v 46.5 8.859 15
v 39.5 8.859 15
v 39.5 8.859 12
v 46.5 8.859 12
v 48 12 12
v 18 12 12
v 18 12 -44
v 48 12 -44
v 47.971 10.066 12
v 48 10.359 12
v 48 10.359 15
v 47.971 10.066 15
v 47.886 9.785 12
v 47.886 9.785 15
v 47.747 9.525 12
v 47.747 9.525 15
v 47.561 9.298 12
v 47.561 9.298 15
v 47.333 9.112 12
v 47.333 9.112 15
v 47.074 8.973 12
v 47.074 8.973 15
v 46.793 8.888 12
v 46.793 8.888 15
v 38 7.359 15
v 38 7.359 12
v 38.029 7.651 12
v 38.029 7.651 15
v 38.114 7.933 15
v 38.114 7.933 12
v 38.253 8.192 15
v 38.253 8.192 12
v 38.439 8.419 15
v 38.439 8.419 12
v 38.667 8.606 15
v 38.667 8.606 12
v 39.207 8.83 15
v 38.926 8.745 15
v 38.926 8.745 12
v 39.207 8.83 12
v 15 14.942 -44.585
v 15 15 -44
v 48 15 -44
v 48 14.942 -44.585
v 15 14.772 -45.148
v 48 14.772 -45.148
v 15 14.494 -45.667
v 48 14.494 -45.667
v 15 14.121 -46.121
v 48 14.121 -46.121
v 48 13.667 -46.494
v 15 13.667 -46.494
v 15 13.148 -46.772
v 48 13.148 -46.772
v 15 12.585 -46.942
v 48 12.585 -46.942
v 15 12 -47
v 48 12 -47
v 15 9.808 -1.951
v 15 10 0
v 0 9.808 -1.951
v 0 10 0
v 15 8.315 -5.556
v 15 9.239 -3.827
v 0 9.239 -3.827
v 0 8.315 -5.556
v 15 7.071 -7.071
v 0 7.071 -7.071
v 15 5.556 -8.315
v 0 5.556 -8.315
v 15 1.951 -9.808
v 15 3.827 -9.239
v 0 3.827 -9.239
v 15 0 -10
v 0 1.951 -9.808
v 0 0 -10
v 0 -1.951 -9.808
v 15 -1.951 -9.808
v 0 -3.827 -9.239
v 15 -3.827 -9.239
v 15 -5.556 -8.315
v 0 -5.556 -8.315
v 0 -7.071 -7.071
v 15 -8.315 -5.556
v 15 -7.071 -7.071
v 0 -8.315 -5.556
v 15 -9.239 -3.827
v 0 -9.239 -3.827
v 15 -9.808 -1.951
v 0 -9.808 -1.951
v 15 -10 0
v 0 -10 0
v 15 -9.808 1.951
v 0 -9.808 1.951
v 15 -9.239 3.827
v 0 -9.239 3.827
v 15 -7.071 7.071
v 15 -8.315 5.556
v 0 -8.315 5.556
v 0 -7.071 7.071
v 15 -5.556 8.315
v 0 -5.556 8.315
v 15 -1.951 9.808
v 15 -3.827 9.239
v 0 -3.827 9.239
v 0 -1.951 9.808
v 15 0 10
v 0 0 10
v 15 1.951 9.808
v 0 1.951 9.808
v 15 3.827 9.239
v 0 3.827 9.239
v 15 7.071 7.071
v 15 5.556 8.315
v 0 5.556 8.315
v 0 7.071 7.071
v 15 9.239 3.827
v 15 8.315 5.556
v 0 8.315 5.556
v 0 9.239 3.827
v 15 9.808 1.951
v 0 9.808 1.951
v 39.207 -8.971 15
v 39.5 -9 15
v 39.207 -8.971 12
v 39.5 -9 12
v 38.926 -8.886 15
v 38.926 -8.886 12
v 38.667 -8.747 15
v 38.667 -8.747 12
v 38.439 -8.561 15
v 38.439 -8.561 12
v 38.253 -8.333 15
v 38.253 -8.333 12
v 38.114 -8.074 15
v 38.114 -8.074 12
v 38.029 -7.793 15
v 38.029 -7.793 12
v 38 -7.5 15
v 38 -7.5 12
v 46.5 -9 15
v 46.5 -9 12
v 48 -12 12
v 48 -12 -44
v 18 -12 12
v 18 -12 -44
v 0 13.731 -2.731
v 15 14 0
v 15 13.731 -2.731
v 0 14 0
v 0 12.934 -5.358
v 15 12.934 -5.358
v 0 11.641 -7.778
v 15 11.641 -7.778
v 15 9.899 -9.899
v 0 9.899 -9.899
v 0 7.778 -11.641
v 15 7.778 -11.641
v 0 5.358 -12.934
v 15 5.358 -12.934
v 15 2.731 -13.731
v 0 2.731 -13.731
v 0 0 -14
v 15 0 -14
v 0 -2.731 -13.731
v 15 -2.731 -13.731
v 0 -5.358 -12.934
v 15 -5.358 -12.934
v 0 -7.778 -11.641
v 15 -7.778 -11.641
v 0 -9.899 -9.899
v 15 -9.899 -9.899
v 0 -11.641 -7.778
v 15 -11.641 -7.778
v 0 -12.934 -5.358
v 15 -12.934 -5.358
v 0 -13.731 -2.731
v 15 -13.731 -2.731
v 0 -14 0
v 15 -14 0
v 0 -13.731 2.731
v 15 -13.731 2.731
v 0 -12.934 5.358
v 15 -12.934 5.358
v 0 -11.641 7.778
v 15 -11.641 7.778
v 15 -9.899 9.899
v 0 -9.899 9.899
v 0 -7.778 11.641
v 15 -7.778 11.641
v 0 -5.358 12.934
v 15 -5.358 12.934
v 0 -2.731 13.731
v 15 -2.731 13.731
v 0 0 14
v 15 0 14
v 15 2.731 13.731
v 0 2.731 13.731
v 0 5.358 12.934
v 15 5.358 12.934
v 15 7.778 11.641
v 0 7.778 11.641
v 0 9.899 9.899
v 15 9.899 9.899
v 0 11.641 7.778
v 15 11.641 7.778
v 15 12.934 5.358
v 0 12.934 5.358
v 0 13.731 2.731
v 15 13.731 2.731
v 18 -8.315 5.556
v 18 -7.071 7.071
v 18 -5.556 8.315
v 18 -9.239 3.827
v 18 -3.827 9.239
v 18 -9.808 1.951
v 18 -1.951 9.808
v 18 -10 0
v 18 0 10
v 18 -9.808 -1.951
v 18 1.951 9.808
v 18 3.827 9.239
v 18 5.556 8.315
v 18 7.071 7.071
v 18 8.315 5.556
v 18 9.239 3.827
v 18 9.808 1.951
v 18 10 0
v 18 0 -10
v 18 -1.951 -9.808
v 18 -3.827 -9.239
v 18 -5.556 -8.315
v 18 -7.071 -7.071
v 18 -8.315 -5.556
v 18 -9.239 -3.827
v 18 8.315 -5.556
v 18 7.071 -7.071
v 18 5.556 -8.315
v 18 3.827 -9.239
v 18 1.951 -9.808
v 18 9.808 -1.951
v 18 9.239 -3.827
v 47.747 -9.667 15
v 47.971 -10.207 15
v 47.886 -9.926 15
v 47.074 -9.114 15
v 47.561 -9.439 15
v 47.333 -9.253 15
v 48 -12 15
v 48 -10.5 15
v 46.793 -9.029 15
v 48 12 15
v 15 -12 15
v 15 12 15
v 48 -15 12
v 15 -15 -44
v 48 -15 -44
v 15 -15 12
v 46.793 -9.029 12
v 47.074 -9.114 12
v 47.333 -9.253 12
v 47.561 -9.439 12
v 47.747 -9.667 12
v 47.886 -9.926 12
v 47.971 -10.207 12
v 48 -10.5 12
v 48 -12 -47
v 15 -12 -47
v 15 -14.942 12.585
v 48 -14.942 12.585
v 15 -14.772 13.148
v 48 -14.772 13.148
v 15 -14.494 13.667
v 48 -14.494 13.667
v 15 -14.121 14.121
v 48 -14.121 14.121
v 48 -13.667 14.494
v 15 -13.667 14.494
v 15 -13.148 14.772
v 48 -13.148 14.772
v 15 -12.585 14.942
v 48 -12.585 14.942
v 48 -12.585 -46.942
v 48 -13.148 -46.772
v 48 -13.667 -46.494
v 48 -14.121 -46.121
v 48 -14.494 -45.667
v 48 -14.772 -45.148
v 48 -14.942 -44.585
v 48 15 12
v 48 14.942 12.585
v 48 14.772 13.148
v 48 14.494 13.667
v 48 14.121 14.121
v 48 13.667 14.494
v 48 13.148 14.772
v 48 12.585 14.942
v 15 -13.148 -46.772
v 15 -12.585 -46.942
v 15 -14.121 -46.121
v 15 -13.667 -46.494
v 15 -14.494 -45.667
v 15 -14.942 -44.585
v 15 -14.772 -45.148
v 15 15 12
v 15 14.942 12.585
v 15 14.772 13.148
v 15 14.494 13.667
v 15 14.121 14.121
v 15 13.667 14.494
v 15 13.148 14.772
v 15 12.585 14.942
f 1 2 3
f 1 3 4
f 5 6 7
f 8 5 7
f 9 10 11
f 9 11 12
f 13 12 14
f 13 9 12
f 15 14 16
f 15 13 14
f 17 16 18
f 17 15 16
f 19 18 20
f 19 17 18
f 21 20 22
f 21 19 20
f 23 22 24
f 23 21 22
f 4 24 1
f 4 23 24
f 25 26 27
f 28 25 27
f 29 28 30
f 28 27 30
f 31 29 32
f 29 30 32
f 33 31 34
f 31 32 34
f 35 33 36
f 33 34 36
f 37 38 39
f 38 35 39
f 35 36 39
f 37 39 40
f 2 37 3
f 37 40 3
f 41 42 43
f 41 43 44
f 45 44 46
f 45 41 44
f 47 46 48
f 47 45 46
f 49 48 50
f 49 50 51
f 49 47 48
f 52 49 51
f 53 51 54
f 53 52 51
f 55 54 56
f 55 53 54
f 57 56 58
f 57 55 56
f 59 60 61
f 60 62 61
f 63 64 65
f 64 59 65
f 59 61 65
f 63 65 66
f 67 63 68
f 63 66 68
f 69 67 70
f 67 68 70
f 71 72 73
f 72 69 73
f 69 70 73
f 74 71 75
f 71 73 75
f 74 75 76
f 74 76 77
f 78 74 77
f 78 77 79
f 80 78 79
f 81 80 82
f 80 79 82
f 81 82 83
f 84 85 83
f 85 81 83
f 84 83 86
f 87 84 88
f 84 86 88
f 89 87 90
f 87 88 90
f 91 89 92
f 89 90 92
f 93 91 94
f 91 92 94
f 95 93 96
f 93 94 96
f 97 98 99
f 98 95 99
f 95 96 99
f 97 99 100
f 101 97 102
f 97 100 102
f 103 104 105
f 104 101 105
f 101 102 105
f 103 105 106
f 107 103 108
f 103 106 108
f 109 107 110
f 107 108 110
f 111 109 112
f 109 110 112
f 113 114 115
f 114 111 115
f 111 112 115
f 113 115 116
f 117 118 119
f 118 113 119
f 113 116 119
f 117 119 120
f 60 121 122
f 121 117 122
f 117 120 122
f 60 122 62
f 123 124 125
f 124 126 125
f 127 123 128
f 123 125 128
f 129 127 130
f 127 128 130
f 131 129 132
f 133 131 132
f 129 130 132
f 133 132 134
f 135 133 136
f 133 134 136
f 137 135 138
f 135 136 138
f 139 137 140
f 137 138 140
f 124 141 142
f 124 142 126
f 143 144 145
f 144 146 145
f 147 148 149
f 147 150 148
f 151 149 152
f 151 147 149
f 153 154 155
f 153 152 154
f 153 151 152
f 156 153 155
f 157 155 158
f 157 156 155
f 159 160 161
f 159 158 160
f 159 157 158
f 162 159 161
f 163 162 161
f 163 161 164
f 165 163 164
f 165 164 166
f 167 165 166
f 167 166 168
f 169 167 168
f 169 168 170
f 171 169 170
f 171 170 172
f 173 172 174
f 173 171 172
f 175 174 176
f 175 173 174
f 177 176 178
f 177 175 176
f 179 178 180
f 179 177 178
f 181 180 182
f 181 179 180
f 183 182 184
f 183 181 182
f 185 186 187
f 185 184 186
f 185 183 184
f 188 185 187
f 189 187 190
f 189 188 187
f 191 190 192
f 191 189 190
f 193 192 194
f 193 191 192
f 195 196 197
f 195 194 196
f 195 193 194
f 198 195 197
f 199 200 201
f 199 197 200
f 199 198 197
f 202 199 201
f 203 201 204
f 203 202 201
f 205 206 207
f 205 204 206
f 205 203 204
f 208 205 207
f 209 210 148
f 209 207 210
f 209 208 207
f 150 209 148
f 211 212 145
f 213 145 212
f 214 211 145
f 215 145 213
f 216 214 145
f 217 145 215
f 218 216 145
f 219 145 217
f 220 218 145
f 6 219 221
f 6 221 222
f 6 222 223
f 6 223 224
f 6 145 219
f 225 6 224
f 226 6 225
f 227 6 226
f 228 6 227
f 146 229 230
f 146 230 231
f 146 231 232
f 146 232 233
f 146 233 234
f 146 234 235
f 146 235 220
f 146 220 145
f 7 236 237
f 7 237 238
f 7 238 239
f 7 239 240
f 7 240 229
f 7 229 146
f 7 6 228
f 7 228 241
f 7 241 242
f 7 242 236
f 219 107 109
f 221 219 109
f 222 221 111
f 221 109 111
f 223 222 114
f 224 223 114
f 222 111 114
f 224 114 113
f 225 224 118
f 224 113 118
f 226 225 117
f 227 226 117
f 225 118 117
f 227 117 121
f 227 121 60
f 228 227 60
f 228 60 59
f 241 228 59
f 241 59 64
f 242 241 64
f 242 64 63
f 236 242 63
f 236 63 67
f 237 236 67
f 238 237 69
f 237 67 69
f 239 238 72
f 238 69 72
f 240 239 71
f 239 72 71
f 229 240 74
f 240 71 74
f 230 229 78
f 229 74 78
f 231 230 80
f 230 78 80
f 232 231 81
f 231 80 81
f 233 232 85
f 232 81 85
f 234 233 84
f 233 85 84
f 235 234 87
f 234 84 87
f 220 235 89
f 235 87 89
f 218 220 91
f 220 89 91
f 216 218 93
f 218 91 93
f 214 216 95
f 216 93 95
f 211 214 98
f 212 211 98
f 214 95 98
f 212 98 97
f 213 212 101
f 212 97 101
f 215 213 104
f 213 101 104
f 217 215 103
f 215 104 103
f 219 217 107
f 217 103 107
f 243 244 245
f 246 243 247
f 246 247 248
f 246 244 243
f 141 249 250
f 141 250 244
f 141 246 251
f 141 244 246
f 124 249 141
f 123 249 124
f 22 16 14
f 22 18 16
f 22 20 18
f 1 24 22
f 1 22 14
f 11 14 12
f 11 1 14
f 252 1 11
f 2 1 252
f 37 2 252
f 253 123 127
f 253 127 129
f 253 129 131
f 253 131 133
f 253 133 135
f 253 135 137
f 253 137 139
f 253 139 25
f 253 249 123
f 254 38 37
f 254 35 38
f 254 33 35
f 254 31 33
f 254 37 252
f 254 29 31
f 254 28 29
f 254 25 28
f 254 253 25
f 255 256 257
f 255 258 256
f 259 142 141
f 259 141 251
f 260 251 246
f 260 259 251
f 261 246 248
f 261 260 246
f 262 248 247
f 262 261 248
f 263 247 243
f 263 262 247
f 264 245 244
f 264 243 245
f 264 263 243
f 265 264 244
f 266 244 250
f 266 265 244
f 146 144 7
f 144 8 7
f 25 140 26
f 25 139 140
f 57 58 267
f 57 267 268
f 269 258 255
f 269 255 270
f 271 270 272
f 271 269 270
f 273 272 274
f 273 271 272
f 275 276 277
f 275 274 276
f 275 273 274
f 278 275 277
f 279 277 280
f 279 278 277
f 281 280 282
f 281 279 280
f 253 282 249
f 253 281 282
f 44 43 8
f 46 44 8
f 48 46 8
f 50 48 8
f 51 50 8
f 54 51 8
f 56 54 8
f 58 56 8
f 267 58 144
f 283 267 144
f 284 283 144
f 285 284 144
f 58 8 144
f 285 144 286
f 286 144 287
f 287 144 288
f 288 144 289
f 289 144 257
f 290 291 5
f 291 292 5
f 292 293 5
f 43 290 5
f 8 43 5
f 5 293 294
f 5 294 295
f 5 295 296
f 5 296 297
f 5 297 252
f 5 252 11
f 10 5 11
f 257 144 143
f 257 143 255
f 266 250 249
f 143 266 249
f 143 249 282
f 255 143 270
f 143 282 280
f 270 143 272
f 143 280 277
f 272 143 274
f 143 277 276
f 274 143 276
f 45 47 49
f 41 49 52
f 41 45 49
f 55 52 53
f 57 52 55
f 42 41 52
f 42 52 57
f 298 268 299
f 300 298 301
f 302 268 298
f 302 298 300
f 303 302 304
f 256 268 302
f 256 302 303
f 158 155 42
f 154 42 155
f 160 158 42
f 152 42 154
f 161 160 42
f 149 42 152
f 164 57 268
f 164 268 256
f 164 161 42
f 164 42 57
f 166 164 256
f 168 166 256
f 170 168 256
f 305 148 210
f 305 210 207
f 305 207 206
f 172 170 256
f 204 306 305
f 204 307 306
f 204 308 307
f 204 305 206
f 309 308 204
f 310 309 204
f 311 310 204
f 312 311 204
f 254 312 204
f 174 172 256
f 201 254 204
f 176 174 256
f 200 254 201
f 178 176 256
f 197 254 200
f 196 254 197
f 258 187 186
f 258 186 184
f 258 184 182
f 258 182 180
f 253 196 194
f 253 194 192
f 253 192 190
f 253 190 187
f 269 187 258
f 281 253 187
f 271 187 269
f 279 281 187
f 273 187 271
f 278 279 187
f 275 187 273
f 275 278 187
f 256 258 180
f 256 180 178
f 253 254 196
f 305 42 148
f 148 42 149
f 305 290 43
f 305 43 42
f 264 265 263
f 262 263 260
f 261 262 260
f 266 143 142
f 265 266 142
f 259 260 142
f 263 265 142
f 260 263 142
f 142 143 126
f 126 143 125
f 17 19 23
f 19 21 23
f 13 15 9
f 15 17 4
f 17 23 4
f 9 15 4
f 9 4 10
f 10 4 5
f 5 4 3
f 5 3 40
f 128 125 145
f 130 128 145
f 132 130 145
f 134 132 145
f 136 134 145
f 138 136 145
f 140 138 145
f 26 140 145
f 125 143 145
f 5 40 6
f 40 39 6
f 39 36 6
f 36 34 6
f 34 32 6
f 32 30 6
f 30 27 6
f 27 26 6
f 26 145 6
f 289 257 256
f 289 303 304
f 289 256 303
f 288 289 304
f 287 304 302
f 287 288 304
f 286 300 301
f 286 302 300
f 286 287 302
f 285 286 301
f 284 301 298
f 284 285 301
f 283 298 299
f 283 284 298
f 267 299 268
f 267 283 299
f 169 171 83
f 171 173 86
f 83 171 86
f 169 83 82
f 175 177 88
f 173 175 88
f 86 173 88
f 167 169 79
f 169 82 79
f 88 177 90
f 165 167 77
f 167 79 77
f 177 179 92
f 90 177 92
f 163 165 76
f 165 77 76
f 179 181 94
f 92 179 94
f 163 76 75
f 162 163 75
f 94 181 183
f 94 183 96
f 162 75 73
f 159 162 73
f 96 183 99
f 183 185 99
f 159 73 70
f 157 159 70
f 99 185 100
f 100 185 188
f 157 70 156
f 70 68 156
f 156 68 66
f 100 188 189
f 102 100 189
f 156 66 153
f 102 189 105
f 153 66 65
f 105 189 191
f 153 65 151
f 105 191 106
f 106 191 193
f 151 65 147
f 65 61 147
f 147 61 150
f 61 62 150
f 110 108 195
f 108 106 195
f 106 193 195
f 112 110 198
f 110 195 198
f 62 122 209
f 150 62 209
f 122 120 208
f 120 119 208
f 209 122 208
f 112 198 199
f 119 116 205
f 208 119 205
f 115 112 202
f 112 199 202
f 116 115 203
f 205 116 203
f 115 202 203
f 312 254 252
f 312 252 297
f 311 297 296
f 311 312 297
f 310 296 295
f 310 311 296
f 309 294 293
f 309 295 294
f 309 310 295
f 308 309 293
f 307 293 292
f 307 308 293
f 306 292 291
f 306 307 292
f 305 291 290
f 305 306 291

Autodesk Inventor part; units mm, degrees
ref_plane "YZ Plane" through (0, 0, 0) normal (1, 0, 0) x (0, 1, 0)
ref_plane "XZ Plane" through (0, 0, 0) normal (0, 1, 0) x (-1, 0, 0)
ref_plane "XY Plane" through (0, 0, 0) normal (0, 0, 1) x (1, 0, 0)
sketch "Sketch1" plane through (0, 0, 0) normal (1, 0, 0) x (0, 1, 0)
  circle A0 centre (0, 0) radius 10
  circle A1 centre (0, 0) radius 14
  dimension "d0" = 20
  dimension "d1" = 28
extrude "Extrusion1" add sketch "Sketch1" along normal blind 15
sketch "Sketch2" plane through (15, 0, 0) normal (1, 0, 0) x (0, 0, -1)
  point P0 (0, 0)
sketch "Sketch3" plane through (15, 0, 0) normal (1, 0, 0) x (0, 0, -1)
  circle A0 centre (0, 0) radius 10 projected
  line L0 (-12, 0) -> (-12, 12)
  line L1 (-12, 12) -> (46, 12)
  line L2 (46, 12) -> (46, -12)
  line L3 (46, -12) -> (-12, -12)
  line L4 (-12, -12) -> (-12, 0)
  line L5 (-15, 0) -> (-15, -12)
  line L6 (-15, 0) -> (-15, 12)
  line L7 (-12, 15) -> (46, 15)
  line L8 (49, 12) -> (49, -12)
  line L9 (46, -15) -> (-12, -15)
  arc A1 (49, 12) -> (46, 15) centre (46, 12) ccw
  arc A2 (46, -15) -> (49, -12) centre (46, -12) ccw
  arc A3 (-15, -12) -> (-12, -15) centre (-12, -12) ccw
  arc A4 (-12, 15) -> (-15, 12) centre (-12, 12) ccw
extrude "Extrusion2" add sketch "Sketch3" along normal blind 33 contours L6 A4 L7 A1 L8 A2 L9 A3 L5
sketch "Sketch4" plane through (15, 0, 0) normal (1, 0, 0) x (0, 0, -1)
  line L0 (-12, -12) -> (-12, 12) projected
  line L1 (7.2111, 12) -> (46, 12) projected
  line L2 (-12, 12) -> (46, 12)
  line L3 (46, 12) -> (46, -12)
  line L4 (46, -12) -> (-12, -12) projected
  line L5 (46, -12) -> (-12, -12)
  line L6 (-12, 12) -> (46, 12) projected
  line L7 (-12, -12) -> (-12, 12)
  point P0 (0, 0)
extrude "Extrusion3" add sketch "Sketch4" along normal blind 3
sketch "Sketch5" plane through (15, 0, 0) normal (-1, 0, 0) x (0, 0, 1)
  circle A0 centre (0, 0) radius 10
extrude "Extrusion4" cut sketch "Sketch5" against normal blind 3
sketch "Sketch6" plane through (15, -12, -49) normal (0, 0, -1) x (-1, 0, 0)
  point P0 (15, 12)
sketch "Sketch7" plane through (15, -12, -49) normal (0, 0, -1) x (-1, 0, 0)
  line L0 (0, 0) -> (0, -3) projected
  line L1 (0, -3) -> (0, 27)
  point P0 (15, 12)
  dimension "d22" = 30
sketch "Sketch8" plane through (15, -12, -49) normal (0, 0, -1) x (-1, 0, 0)
  point P0 (0, -3)
  point P1 (-3, 0)
sketch "Sketch9" plane through (15, -12, -49) normal (0, 0, -1) x (-1, 0, 0)
  line L0 (0, 27) -> (0, 24) projected
  line L1 (0, 27) -> (-64, 27)
  line L2 (-64, 27) -> (-64, -3)
  line L3 (0, -3) -> (-33, -3) projected
  line L4 (-64, -3) -> (0, -3)
  line L5 (0, -3) -> (0, 27)
  line L6 (0, 0) -> (0, 24) projected
  line L7 (-3, 24) -> (-3, 0) projected
  line L8 (-3, 0) -> (-3, 24)
  line L9 (0, 24) -> (-33, 24) projected
  line L10 (-3, 24) -> (-61, 24)
  line L11 (-61, 24) -> (-61, 0)
  line L12 (-61, 0) -> (-3, 0)
  line L13 (0, 0) -> (-33, 0) projected
  point P0 (15, 12)
  dimension "d27" = 64
  dimension "d28" = 30
  dimension "d29" = 58
extrude "Extrusion5" add sketch "Sketch9" along normal blind 30 contours L0 L9 L10 L11 L12 L13 L5 L3 L4 L2 L1 | L5 L13 L7 L9
sketch "Sketch10" plane through (48, 12, -49) normal (0, 0, -1) x (-1, 0, 0)
  line L0 (33, 3) -> (-31, 3) projected
  line L1 (33, 3) -> (33, 0) projected
  line L2 (-31, 3) -> (33, 3)
  line L3 (33, 3) -> (33, -27)
  line L4 (33, 0) -> (33, -24) projected
  line L5 (-31, 3) -> (-31, -27) projected
  line L6 (33, -27) -> (-31, -27)
  line L7 (-31, -27) -> (-31, 3)
  point P0 (48, -12)
  dimension "d32" = 30
extrude "Extrusion6" add sketch "Sketch10" against normal blind 5
fillet "Fillet1" radius 3 2 edges at (79, 15, -61.5) (79, -15, -61.5)
sketch "Sketch11" plane through (48, 12, -44) normal (0, 0, 1) x (1, 0, 0)
  line L0 (31, -24) -> (31, 0) projected
  line L1 (31, -12) -> (29, -12)
  line L2 (29, -12) -> (19, -12)
  circle A0 centre (19, -12) radius 10
  point P0 (-48, -12)
  dimension "d36" = 2
  dimension "d37" = 10
extrude "Extrusion7" cut sketch "Sketch11" against normal blind 10.5
sketch "Sketch12" plane through (48, 12, -44) normal (0, 0, 1) x (1, 0, 0)
  arc A0 (28, -7.6411) -> (28, -16.3589) centre (19, -12) ccw projected
  circle A1 centre (19, -12) radius 10
  circle A2 centre (19, -12) radius 10 projected
  circle A3 centre (19, -12) radius 14
  point P0 (-48, -12)
  point P1 (28, -16.3589)
  dimension "d40" = 28
extrude "Extrusion8" add sketch "Sketch12" along normal blind 15
sketch "Sketch13" plane through (15, -12, 15) normal (0, 0, 1) x (1, 0, 0)
  line L0 (33, 0) -> (3, 0) projected
  line L1 (0, -3) -> (33, -3) projected
  line L2 (30.6116, 0) -> (33.6116, 0) construction
  line L3 (33, 0) -> (33, 24) projected
  line L4 (33, 3) -> (23, 3)
  line L5 (23, 3) -> (23, 20.8588)
  line L6 (23, 20.8588) -> (33, 20.8588)
  point P0 (-15, 12)
extrude "Extrusion9" cut sketch "Sketch13" against normal blind 21.75
sketch "Sketch14" plane through (79, -12, -79) normal (1, 0, 0) x (0, 0, -1)
  line L0 (-35, 24) -> (0, 24) projected
  line L1 (-3.7826, 24) -> (-0.7826, 24) construction
  line L2 (0, 0) -> (-35, 0) projected
  line L3 (-3.2489, 0) -> (-0.2489, 0) construction
  line L4 (0, 24) -> (0, 0) projected
  line L5 (0, 3) -> (-10, 3)
  line L6 (0, 3) -> (10, 3) construction
  line L7 (-10, 3) -> (-10, 21)
  line L8 (-10, 21) -> (0, 21)
  point P0 (-79, 12)
  dimension "d53" = 10
  dimension "d54" = 180
extrude "Extrusion10" cut sketch "Sketch14" against normal blind 25.75
sketch "Sketch15" plane through (15, -12, -79) normal (0, 0, -1) x (-1, 0, 0)
  line L0 (8.5716, 47.3564) -> (-2.6139, -49.713)
  line L1 (-2.6139, -49.713) -> (-66.1269, -32.0991)
  line L2 (-66.1269, -32.0991) -> (-83.6498, 8.8041)
  line L3 (-83.6498, 8.8041) -> (-71.64, 52.1092)
  line L4 (-71.64, 52.1092) -> (-17.9136, 47.3564)
  arc A0 (-17.9136, 47.3564) -> (-17.9136, 47.3564) centre (-16.407, 64.3867) ccw
  line L5 (-17.9136, 47.3564) -> (8.5716, 47.3564)
  point P0 (15, 12)
extrude "Extrusion11" cut sketch "Sketch15" against normal blind 30 contours L0 L1 L2 L3 L4 A0 L5 | A0 L5 picked at (-16.2394, 47.3367)
sketch "Sketch16" plane through (15, 15, 12) normal (0, 1, 0) x (1, 0, 0)
  line L0 (33, 56) -> (33, 0) projected
  line L1 (33, 35.3995) -> (33, 94.1554)
  line L2 (33, 94.1554) -> (79.7551, 84.127)
  line L3 (79.7551, 84.127) -> (69.5982, 12)
  line L4 (69.5982, 12) -> (67.3209, 12.3207)
  line L5 (67.3209, 12.3207) -> (33, 35.3995)
  point P0 (-15, 12)
extrude "Extrusion12" cut sketch "Sketch16" against normal blind 77.25
sketch "Sketch18" plane through (48, -15, -49) normal (0, 0, -1) x (-1, 0, 0)
  point P0 (48, 15)
fillet "Fillet2" radius 3 2 edges at (31.5, 15, -49) (31.5, -15, -49)
sketch "Sketch19" plane through (48, -12, -49) normal (0, 0, -1) x (-1, 0, 0)
  line L0 (-10.3978, 34.6876) -> (55.1217, 36.4172)
  line L1 (55.1217, 36.4172) -> (42.8113, -19.5389)
  line L2 (42.8113, -19.5389) -> (-1.2413, -25.4397)
  arc A0 (-1.2413, -25.4397) -> (-3.1744, -22.4893) centre (-5.2865, -25.9815) ccw
  line L3 (-3.1744, -22.4893) -> (-13.3482, 5.1835)
  arc A1 (-13.3482, 5.1835) -> (-11.3134, 8.4392) centre (-14.4287, 8.1225) ccw
  line L4 (-11.3134, 8.4392) -> (-10.3978, 34.6876)
  point P0 (48, 12)
extrude "Extrusion13" cut sketch "Sketch19" against normal blind 5
sketch "Sketch20" plane through (48, -12, -44) normal (0, 0, -1) x (-1, 0, 0)
  line L0 (0, 27) -> (0, 24) projected
  line L1 (0, 27) -> (33, 27)
  line L2 (33, 0) -> (33, -3) projected
  line L3 (33, 27) -> (33, -3)
  line L4 (33, -3) -> (0, -3) projected
  line L5 (33, -3) -> (0, -3)
  line L6 (0, -3) -> (0, 27)
  point P0 (48, 12)
extrude "Extrusion14" add sketch "Sketch20" along normal blind 3
fillet "Fillet3" radius 3 2 edges at (31.5, 15, -47) (31.5, -15, -47)
fillet "Fillet4" radius 1.5 4 edges at (48, 8.8588, 13.5) (38, 8.8588, 13.5) (38, -9, 13.5) (48, -9, 13.5)
properties part number "servo holder 1"
